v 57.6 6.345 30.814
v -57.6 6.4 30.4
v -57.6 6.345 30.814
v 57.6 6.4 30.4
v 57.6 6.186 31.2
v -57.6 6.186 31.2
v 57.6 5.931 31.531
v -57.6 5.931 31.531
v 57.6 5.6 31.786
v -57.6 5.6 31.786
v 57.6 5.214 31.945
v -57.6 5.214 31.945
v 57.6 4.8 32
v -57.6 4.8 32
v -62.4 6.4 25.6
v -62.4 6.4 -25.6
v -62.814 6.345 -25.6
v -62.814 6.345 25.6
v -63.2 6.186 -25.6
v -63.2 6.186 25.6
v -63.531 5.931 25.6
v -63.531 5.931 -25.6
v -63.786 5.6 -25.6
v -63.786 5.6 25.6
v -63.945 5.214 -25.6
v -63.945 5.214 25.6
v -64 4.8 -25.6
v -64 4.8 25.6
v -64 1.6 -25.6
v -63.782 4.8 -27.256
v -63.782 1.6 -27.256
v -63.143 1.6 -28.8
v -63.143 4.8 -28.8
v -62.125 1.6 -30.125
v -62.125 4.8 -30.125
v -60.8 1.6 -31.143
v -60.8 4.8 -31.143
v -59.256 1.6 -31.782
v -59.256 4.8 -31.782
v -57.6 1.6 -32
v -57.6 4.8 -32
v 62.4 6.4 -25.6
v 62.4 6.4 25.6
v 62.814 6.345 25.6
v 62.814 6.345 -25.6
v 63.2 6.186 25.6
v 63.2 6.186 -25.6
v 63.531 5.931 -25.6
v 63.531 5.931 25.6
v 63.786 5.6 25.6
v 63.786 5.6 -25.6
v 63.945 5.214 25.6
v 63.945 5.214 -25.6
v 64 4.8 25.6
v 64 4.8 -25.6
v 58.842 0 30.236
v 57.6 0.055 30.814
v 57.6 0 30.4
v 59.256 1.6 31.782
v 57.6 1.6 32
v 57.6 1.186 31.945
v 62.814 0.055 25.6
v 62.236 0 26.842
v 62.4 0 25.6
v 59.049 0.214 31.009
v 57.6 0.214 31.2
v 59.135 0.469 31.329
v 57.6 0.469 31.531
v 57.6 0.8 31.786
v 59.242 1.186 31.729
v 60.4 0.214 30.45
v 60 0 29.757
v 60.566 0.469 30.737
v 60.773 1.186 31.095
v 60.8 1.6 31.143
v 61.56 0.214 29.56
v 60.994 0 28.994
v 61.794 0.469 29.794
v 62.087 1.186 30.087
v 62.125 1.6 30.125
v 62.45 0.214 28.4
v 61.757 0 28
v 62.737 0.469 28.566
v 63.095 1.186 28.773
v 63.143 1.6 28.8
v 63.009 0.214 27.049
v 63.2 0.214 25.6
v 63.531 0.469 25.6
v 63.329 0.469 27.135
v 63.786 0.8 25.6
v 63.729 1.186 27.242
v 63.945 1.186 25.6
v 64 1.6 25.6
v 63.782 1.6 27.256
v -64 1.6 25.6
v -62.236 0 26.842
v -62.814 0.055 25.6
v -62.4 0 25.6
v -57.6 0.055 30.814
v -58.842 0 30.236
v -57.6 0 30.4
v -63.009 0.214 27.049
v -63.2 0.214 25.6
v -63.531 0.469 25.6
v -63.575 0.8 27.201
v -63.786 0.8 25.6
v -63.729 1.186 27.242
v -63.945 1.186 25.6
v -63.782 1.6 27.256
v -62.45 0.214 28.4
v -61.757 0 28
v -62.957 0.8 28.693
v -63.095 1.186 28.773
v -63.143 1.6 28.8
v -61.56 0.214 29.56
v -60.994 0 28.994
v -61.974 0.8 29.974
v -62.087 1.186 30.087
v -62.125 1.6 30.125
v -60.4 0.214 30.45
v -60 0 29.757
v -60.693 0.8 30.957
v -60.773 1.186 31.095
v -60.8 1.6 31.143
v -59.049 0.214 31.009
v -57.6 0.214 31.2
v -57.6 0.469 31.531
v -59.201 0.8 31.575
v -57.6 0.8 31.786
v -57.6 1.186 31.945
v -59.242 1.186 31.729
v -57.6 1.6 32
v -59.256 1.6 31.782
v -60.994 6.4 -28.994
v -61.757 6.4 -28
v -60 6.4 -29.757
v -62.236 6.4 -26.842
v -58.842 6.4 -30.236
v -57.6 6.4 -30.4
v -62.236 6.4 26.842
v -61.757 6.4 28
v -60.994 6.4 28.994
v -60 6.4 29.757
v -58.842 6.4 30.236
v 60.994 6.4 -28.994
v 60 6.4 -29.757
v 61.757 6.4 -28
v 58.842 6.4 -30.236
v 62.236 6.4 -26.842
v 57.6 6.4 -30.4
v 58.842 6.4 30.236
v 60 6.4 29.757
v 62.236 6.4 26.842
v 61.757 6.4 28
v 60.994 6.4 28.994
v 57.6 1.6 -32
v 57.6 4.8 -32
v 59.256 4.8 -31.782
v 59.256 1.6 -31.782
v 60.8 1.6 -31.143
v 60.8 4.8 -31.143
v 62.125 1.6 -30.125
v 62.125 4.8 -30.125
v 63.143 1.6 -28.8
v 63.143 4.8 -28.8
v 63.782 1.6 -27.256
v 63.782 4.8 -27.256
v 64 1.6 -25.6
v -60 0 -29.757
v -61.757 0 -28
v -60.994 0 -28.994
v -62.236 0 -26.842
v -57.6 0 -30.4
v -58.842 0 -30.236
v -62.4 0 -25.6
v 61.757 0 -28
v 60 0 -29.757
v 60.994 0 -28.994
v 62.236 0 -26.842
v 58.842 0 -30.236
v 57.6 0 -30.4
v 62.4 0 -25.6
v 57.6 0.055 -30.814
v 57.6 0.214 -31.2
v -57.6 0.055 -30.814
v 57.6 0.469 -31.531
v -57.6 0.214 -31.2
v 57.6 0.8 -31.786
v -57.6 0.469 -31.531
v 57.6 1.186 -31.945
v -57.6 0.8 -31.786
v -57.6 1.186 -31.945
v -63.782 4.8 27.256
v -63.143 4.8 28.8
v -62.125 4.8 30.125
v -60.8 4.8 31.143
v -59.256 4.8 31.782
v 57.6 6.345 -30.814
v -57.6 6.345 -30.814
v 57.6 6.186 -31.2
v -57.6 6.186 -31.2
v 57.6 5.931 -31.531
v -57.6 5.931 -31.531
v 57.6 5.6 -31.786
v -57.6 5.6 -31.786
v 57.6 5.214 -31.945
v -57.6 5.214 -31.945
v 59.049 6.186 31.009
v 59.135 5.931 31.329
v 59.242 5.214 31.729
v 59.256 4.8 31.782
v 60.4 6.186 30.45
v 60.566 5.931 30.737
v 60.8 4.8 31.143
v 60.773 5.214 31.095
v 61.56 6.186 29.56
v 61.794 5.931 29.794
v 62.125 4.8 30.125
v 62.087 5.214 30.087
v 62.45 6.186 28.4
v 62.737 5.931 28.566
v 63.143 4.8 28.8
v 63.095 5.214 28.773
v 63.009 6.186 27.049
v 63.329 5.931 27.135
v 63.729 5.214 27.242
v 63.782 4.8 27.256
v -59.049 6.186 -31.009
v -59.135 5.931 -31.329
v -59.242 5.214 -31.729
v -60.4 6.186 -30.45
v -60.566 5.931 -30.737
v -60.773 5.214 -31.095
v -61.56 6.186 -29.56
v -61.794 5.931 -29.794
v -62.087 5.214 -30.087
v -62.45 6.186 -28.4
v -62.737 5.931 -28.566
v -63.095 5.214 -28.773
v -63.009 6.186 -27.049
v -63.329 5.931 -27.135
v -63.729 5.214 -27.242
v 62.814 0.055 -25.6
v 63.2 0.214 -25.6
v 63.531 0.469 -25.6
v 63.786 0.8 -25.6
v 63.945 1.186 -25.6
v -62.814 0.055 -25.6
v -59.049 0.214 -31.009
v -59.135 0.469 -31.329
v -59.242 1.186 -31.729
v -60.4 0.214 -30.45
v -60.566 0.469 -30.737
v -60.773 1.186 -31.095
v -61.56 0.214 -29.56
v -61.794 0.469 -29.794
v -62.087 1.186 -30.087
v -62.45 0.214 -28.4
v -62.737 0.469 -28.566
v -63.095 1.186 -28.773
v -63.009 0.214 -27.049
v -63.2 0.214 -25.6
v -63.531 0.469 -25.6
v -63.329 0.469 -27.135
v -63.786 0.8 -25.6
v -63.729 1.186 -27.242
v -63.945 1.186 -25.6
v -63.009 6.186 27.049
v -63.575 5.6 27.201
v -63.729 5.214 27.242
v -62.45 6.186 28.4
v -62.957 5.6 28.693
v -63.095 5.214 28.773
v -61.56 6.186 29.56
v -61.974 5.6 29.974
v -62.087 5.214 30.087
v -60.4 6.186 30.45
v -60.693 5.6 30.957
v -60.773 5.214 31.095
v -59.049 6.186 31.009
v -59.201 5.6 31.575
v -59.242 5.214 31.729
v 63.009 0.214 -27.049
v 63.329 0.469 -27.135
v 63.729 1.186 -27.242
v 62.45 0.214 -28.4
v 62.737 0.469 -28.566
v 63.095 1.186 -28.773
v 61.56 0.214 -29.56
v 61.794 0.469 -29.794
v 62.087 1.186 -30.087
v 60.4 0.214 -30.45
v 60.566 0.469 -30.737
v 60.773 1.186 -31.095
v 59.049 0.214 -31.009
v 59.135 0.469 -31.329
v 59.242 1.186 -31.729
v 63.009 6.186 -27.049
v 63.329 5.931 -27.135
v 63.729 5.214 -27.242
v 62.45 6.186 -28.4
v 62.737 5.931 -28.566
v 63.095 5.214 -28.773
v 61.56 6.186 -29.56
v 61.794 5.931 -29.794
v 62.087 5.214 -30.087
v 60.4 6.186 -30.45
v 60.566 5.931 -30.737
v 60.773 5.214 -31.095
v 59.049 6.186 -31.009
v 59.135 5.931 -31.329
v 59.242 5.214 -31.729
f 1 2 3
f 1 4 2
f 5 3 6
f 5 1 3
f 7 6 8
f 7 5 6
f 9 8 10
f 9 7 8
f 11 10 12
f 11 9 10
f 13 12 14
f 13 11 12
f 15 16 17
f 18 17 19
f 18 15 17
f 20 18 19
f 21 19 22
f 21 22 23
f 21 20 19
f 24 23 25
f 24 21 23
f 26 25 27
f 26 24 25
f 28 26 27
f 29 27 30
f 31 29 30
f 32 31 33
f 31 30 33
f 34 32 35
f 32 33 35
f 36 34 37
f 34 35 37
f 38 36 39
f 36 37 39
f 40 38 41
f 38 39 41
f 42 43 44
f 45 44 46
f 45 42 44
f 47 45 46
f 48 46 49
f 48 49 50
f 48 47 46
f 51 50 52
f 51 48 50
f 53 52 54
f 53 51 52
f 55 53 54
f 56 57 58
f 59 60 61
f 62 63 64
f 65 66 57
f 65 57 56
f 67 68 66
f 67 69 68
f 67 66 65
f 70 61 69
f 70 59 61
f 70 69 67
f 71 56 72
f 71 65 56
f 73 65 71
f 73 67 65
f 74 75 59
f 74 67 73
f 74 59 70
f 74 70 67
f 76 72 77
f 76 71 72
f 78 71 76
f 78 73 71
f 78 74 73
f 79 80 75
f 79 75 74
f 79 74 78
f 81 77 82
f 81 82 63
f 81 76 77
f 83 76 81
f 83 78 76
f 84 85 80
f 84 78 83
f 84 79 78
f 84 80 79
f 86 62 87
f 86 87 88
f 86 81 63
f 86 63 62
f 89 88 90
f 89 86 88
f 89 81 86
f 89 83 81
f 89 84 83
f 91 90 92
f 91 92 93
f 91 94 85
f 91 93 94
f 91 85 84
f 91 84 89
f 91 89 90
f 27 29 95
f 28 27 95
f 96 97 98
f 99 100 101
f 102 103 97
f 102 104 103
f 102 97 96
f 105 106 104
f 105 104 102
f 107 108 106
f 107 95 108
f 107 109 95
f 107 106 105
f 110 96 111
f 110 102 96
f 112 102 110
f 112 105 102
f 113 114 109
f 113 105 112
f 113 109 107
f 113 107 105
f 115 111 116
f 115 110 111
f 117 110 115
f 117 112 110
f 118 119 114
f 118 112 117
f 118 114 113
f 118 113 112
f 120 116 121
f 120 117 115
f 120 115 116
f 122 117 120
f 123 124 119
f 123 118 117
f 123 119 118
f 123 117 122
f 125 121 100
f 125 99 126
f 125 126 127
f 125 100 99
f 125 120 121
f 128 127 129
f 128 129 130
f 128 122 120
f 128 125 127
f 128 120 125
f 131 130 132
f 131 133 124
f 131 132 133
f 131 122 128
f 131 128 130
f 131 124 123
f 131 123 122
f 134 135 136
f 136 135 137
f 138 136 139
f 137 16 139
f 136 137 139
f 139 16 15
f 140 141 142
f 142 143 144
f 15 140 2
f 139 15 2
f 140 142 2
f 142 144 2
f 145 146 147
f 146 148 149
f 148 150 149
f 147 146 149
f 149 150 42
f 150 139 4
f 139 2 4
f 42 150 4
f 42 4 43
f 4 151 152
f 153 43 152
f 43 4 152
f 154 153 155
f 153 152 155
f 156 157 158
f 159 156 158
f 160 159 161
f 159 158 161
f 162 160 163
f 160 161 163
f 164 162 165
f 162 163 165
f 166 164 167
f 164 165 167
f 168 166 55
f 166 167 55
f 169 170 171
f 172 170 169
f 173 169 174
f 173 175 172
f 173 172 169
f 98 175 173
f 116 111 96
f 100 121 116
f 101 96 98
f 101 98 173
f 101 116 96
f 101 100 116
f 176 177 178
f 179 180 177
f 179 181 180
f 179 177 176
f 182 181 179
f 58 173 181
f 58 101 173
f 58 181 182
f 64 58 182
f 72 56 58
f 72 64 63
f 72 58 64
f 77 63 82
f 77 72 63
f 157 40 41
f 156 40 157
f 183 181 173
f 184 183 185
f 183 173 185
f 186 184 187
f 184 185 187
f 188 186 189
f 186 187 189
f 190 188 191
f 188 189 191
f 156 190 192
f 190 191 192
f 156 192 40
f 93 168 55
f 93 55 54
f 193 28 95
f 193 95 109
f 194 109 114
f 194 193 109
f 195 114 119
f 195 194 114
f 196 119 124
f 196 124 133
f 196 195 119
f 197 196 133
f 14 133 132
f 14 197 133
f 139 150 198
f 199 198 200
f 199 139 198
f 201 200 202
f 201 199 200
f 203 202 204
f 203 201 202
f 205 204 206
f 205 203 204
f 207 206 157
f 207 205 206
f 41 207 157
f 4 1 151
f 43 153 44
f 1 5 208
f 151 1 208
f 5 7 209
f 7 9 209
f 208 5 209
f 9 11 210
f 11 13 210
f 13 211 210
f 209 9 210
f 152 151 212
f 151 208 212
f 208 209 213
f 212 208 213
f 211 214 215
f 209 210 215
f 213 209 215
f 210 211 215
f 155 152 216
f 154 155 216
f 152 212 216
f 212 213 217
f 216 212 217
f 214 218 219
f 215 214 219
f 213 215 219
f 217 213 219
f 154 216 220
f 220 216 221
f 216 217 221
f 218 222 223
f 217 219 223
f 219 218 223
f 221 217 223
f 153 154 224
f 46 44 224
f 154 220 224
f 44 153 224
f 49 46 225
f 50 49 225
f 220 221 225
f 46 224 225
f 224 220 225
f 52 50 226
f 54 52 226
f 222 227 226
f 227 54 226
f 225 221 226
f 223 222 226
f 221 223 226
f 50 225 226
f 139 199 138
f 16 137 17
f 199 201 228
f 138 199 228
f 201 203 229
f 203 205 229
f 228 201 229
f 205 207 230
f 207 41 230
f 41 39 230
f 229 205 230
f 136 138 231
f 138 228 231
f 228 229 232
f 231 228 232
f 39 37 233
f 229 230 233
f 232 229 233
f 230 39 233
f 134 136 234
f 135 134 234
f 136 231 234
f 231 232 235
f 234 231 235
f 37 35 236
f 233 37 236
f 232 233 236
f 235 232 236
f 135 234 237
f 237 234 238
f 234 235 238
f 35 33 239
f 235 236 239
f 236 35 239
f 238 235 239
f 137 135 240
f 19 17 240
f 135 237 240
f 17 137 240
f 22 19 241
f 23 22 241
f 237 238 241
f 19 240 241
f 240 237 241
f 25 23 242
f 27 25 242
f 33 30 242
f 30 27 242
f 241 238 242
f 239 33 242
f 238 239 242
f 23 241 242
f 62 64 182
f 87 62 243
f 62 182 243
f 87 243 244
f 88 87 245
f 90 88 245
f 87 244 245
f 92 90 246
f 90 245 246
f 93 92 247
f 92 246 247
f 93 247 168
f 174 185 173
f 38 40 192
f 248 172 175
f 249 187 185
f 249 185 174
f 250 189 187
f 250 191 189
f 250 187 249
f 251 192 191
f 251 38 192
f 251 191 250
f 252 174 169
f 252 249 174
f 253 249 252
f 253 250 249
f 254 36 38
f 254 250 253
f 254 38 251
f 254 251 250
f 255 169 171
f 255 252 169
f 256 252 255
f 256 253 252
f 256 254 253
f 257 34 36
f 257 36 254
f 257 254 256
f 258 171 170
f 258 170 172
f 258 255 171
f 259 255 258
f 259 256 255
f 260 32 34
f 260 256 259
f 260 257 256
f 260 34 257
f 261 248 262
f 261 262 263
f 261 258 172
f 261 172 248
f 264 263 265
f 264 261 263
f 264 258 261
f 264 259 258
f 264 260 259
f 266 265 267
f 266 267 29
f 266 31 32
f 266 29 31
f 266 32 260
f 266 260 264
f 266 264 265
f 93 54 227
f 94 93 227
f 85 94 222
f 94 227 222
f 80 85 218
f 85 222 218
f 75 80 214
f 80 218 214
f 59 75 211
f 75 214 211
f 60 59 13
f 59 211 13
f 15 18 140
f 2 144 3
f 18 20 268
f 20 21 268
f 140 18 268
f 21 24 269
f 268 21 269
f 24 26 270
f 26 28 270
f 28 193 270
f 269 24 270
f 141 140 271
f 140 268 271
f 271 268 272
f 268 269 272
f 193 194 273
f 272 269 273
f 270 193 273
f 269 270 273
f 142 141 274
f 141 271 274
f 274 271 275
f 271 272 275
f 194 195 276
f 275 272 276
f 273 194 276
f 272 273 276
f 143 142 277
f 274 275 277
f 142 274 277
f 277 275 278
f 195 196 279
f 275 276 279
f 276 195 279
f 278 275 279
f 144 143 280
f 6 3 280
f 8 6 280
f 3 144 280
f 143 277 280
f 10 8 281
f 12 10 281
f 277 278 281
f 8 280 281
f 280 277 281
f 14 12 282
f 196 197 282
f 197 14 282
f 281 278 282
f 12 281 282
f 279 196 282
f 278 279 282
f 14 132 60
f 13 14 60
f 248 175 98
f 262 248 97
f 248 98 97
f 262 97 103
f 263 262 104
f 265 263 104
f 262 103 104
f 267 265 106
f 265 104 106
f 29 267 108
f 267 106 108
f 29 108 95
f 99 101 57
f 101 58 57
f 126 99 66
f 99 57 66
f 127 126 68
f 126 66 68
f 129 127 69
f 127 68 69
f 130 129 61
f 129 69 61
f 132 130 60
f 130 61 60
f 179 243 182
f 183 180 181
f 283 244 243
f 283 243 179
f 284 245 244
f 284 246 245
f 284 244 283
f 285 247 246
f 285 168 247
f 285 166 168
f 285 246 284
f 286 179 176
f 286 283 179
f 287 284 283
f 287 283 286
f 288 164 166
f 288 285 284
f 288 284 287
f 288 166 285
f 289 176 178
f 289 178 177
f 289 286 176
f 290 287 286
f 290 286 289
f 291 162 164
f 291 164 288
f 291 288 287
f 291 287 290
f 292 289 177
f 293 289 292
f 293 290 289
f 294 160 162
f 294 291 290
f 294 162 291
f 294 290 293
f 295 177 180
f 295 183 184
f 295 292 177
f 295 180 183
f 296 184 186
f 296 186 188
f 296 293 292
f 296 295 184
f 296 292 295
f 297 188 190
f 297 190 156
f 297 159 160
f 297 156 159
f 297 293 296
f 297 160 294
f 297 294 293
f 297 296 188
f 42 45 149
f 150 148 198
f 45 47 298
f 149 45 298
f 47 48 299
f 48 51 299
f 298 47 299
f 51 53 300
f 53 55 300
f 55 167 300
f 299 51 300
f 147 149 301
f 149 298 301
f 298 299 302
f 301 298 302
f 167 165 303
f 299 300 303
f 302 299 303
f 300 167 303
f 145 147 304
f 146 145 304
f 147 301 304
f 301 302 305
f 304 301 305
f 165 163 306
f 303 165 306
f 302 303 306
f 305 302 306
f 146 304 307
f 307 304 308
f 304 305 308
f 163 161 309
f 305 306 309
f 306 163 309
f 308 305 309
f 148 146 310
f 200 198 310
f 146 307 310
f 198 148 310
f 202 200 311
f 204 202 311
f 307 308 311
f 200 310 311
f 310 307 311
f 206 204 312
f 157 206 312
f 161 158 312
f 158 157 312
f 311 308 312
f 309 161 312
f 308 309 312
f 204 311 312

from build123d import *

# Parameters (mm, degrees)
F0_W     = 128
F0_H     = 64
F1_DEPTH = 6.4
F2_R     = 6.4
F3_R     = 1.6


with BuildPart() as f1:
    # F0 (on Front) → F1 (new body)
    with BuildSketch(Plane.XZ):
        Rectangle(F0_W, F0_H)
    extrude(amount=-F1_DEPTH)

    # F2
    f2_edges = [f1.edges().sort_by_distance(p)[0] for p in [
        (64, 3.2, 32),
        (64, 3.2, -32),
        (-64, 3.2, 32),
        (-64, 3.2, -32),
    ]]
    fillet(f2_edges, radius=F2_R)

    # F3
    f3_edges = [f1.edges().sort_by_distance(p)[0] for p in [
        (0, 0, 32),
        (62.125483, 0, 30.125483),
        (-62.125483, 0, 30.125483),
        (64, 0, 0),
        (-64, 0, 0),
        (62.125483, 0, -30.125483),
        (-62.125483, 0, -30.125483),
        (0, 0, -32),
        (0, 6.4, 32),
        (62.125483, 6.4, 30.125483),
        (-62.125483, 6.4, 30.125483),
        (64, 6.4, 0),
        (-64, 6.4, 0),
        (62.125483, 6.4, -30.125483),
        (-62.125483, 6.4, -30.125483),
        (0, 6.4, -32),
    ]]
    fillet(f3_edges, radius=F3_R)


solid = f1.part
